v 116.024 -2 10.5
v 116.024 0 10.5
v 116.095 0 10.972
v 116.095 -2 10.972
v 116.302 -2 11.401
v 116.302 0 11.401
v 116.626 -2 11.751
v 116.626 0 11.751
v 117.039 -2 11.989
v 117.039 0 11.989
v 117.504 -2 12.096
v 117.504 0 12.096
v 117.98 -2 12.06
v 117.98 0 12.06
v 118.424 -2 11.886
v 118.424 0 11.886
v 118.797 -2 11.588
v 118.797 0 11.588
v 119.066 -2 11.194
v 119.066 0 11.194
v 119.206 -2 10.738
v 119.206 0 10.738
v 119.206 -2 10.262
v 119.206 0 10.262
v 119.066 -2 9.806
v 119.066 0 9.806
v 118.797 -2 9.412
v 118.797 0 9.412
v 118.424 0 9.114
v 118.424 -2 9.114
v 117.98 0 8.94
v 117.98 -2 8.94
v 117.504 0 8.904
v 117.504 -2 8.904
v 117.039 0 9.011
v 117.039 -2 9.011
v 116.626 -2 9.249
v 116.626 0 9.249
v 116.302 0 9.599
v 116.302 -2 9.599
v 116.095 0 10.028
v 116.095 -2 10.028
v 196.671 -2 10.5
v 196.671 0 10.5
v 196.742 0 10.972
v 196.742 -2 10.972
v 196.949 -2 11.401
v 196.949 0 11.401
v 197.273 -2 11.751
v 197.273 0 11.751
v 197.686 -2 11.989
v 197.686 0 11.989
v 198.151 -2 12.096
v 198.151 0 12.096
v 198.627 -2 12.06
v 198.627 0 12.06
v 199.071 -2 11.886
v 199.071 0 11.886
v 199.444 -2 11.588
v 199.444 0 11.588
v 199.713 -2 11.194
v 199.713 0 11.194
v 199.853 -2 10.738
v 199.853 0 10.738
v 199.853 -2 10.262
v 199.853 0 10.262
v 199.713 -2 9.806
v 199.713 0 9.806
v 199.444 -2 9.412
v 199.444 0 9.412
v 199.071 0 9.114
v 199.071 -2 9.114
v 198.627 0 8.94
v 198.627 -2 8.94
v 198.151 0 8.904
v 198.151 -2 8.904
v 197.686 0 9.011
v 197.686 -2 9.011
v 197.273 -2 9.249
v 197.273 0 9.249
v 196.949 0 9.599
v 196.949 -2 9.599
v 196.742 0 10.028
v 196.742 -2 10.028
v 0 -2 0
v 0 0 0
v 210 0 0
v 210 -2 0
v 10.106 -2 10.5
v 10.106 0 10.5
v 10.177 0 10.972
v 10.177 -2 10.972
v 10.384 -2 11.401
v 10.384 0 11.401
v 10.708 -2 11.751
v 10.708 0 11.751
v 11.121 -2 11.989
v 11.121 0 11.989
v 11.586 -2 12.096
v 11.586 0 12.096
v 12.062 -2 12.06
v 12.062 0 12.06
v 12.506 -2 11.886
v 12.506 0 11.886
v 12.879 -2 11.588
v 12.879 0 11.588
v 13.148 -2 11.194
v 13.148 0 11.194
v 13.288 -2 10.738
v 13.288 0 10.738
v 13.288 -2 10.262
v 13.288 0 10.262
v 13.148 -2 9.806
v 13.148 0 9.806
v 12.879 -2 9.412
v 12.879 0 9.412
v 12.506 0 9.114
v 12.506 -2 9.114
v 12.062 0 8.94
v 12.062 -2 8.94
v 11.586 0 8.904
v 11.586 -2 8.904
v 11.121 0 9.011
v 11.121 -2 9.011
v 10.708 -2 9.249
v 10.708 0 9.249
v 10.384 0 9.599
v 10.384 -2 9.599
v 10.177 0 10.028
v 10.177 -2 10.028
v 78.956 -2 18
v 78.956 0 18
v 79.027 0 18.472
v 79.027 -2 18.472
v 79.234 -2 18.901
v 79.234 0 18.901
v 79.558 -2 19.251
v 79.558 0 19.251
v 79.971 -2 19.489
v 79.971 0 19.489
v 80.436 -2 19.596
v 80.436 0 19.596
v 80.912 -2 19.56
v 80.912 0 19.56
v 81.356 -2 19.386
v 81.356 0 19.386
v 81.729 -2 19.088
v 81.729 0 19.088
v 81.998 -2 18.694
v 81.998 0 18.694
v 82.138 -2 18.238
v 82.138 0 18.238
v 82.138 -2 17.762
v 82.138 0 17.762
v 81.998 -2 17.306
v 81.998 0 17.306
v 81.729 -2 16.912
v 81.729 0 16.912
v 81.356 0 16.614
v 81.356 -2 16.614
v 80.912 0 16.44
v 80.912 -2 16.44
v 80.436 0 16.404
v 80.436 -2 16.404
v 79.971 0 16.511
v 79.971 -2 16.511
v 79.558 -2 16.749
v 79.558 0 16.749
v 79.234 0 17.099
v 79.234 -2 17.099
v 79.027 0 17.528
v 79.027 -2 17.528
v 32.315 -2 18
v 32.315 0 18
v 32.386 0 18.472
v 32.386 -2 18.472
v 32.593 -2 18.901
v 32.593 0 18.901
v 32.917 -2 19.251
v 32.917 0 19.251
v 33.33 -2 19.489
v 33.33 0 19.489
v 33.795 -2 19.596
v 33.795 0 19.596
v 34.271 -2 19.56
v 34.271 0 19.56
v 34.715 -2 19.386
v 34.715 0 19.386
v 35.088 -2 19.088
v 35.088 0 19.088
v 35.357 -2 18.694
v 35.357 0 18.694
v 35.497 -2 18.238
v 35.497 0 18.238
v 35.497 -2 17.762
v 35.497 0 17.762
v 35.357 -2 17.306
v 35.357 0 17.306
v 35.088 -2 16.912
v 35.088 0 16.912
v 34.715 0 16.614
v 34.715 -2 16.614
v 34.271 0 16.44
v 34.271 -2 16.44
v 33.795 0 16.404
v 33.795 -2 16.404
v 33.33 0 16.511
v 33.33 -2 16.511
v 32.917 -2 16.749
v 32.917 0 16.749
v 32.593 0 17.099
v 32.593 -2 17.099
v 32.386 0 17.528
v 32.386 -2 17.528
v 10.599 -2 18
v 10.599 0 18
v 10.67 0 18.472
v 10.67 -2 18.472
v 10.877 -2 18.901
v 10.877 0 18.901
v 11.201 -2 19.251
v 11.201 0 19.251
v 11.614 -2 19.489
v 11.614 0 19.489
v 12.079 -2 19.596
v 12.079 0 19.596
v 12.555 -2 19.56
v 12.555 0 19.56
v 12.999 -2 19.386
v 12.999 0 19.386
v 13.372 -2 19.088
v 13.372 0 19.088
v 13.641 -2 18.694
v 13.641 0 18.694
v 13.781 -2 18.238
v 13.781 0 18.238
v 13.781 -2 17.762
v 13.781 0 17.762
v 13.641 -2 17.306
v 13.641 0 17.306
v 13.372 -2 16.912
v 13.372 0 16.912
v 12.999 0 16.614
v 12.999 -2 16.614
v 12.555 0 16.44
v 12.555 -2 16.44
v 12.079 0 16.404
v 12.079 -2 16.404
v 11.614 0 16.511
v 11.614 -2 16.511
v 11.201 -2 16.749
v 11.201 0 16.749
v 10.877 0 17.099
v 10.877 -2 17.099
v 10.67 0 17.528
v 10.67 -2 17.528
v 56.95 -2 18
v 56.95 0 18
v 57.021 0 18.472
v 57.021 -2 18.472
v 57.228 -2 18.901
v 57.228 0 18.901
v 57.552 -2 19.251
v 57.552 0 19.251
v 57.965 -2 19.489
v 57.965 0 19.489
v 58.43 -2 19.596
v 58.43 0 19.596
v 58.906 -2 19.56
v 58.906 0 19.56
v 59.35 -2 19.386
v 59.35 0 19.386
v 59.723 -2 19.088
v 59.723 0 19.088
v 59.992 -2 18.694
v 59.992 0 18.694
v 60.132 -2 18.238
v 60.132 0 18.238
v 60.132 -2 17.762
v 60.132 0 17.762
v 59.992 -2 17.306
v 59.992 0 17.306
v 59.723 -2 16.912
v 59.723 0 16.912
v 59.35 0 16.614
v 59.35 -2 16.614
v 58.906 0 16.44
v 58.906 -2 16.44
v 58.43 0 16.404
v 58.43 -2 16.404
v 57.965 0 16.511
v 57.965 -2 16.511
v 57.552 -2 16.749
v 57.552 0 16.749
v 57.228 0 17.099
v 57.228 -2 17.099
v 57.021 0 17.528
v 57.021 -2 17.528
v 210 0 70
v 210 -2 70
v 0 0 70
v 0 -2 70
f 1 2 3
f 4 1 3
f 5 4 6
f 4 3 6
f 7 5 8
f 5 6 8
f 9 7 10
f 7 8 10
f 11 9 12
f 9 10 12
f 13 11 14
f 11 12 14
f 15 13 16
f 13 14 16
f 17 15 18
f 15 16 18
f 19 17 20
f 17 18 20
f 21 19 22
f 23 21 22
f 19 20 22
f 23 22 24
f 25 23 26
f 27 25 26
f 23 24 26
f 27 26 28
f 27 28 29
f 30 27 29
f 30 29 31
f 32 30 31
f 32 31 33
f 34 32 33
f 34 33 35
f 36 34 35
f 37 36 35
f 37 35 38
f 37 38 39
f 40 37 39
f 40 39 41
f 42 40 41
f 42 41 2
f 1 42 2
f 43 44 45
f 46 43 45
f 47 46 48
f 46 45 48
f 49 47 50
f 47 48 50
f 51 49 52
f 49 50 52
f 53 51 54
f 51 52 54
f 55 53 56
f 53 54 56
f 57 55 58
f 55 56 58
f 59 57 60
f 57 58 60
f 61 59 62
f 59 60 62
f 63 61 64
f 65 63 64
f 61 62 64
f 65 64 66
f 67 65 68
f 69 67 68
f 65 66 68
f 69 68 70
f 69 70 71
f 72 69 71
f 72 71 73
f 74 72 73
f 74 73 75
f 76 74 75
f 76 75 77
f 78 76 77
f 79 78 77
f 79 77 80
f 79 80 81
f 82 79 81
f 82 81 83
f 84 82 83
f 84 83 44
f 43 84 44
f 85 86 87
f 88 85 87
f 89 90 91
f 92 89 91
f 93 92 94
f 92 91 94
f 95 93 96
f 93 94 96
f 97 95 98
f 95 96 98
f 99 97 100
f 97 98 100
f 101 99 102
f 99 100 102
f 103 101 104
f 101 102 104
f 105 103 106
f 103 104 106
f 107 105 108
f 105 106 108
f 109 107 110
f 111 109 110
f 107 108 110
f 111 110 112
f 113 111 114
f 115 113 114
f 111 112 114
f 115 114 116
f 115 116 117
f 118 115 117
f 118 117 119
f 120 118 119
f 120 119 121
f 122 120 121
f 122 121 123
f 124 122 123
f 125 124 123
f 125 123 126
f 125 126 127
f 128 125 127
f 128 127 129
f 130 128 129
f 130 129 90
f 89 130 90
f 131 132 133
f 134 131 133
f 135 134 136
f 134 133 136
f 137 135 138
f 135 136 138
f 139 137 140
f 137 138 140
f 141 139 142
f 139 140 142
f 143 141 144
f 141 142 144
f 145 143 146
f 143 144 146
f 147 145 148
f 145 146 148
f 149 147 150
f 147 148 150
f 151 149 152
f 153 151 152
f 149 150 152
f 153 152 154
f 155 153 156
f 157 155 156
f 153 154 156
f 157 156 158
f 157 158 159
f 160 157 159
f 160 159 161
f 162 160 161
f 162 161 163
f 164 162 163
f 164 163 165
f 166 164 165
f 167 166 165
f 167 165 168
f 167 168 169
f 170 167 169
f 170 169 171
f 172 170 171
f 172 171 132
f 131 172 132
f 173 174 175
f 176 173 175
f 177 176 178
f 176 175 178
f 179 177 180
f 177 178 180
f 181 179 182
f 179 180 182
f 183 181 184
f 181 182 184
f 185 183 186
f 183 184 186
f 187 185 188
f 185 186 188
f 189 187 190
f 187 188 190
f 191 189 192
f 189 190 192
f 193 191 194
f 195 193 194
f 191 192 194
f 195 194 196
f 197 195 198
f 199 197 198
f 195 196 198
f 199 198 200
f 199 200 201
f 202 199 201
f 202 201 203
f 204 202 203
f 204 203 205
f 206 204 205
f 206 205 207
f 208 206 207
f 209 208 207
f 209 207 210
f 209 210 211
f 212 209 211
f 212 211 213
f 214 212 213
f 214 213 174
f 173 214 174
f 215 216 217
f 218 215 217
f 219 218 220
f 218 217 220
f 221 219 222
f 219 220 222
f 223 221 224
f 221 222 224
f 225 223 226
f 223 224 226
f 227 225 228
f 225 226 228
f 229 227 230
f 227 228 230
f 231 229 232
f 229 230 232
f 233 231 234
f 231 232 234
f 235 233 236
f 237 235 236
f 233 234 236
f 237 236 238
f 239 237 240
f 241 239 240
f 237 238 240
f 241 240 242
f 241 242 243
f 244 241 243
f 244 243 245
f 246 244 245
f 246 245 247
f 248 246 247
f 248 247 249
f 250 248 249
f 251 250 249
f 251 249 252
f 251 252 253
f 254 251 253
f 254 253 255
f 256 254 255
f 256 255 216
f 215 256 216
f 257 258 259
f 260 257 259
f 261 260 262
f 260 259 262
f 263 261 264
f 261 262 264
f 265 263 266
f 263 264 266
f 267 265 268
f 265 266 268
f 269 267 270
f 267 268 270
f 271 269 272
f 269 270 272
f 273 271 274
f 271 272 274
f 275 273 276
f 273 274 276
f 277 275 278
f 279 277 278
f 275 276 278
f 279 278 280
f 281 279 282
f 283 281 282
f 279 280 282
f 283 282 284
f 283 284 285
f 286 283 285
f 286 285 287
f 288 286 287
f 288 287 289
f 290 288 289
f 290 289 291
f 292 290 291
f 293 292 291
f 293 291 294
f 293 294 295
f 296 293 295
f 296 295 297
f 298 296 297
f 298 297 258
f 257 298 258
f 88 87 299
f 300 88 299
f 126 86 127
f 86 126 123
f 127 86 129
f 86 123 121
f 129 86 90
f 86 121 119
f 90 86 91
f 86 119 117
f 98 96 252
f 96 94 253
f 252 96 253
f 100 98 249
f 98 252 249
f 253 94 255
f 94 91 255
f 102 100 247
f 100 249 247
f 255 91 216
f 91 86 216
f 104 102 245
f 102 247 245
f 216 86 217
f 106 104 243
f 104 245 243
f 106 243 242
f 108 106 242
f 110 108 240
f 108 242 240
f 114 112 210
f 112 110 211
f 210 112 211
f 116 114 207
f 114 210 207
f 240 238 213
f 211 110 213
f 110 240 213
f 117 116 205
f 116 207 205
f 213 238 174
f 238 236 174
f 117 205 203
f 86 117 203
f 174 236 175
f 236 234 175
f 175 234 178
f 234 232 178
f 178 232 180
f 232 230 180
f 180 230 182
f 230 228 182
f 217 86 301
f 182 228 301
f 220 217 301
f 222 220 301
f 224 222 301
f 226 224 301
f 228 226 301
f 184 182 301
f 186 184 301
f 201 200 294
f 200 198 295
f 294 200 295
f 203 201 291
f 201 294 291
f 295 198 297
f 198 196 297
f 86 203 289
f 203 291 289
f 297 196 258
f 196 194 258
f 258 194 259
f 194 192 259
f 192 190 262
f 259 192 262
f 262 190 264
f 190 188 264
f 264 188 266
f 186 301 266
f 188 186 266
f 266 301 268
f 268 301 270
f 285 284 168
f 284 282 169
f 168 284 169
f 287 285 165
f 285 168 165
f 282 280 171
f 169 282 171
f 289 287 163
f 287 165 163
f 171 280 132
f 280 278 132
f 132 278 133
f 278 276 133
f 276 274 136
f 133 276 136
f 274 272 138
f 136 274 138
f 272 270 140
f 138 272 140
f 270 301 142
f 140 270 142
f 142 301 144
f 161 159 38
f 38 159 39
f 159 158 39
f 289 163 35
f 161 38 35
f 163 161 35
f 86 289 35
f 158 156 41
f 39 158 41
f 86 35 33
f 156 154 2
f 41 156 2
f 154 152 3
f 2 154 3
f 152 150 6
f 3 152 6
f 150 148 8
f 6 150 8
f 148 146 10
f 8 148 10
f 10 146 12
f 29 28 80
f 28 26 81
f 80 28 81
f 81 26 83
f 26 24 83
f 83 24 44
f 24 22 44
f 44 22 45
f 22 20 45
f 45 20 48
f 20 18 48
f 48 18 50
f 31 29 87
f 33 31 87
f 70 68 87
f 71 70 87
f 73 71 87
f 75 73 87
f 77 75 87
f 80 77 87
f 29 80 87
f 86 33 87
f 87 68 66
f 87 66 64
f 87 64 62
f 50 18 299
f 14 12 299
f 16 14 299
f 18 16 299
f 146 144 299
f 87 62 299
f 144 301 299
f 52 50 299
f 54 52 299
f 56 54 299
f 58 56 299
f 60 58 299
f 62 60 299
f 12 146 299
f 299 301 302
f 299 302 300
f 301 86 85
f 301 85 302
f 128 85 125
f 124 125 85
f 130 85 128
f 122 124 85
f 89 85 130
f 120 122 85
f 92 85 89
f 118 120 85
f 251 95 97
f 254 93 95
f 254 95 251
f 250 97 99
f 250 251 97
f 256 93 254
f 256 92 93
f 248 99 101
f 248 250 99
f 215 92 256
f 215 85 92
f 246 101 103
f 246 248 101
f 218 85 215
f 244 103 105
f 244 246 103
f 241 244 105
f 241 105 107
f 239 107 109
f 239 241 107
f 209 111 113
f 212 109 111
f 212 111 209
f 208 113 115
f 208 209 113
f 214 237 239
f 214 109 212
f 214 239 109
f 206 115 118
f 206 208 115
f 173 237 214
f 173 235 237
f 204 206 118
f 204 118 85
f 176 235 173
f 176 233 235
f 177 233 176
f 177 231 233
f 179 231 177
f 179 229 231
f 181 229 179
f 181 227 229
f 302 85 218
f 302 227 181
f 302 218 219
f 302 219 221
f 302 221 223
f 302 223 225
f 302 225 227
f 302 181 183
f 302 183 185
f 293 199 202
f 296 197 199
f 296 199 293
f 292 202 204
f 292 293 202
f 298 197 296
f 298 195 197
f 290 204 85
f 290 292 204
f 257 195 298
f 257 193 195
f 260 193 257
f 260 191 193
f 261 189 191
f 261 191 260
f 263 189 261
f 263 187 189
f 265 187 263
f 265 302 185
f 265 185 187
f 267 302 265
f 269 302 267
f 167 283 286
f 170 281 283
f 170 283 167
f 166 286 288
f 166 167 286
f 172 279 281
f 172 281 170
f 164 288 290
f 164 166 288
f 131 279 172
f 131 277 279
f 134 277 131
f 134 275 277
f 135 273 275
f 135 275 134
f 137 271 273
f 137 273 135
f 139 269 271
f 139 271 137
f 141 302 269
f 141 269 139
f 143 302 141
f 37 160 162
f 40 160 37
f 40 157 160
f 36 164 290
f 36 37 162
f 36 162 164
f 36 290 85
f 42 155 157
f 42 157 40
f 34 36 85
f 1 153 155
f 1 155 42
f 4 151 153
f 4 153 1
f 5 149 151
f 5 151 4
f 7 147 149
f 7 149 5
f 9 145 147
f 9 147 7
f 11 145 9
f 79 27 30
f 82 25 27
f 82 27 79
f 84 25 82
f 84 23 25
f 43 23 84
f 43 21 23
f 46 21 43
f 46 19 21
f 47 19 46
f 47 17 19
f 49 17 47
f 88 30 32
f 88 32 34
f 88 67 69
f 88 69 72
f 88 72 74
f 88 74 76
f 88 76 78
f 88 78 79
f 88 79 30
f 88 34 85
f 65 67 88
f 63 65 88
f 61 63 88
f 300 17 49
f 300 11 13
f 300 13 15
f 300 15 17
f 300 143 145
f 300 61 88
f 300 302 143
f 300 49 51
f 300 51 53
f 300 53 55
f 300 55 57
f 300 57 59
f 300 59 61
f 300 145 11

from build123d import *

# Parameters (mm, degrees)
F0_W     = 210
F0_H     = 70
F1_DEPTH = 2
F3_D     = 3.2


with BuildPart() as f1:
    # F0 (on Front) → F1 (new body)
    with BuildSketch(Plane.XZ):
        with Locations((105, 35)):
            Rectangle(F0_W, F0_H)
    extrude(amount=F1_DEPTH)

    # F3 (through all)
    with Locations(Plane.XZ.offset(2)):
        with Locations((12.199, 18), (11.706, 10.5), (33.915, 18), (58.55, 18), (80.556, 18), (117.624, 10.5), (198.271, 10.5)):
            Hole(F3_D / 2)


solid = f1.part
